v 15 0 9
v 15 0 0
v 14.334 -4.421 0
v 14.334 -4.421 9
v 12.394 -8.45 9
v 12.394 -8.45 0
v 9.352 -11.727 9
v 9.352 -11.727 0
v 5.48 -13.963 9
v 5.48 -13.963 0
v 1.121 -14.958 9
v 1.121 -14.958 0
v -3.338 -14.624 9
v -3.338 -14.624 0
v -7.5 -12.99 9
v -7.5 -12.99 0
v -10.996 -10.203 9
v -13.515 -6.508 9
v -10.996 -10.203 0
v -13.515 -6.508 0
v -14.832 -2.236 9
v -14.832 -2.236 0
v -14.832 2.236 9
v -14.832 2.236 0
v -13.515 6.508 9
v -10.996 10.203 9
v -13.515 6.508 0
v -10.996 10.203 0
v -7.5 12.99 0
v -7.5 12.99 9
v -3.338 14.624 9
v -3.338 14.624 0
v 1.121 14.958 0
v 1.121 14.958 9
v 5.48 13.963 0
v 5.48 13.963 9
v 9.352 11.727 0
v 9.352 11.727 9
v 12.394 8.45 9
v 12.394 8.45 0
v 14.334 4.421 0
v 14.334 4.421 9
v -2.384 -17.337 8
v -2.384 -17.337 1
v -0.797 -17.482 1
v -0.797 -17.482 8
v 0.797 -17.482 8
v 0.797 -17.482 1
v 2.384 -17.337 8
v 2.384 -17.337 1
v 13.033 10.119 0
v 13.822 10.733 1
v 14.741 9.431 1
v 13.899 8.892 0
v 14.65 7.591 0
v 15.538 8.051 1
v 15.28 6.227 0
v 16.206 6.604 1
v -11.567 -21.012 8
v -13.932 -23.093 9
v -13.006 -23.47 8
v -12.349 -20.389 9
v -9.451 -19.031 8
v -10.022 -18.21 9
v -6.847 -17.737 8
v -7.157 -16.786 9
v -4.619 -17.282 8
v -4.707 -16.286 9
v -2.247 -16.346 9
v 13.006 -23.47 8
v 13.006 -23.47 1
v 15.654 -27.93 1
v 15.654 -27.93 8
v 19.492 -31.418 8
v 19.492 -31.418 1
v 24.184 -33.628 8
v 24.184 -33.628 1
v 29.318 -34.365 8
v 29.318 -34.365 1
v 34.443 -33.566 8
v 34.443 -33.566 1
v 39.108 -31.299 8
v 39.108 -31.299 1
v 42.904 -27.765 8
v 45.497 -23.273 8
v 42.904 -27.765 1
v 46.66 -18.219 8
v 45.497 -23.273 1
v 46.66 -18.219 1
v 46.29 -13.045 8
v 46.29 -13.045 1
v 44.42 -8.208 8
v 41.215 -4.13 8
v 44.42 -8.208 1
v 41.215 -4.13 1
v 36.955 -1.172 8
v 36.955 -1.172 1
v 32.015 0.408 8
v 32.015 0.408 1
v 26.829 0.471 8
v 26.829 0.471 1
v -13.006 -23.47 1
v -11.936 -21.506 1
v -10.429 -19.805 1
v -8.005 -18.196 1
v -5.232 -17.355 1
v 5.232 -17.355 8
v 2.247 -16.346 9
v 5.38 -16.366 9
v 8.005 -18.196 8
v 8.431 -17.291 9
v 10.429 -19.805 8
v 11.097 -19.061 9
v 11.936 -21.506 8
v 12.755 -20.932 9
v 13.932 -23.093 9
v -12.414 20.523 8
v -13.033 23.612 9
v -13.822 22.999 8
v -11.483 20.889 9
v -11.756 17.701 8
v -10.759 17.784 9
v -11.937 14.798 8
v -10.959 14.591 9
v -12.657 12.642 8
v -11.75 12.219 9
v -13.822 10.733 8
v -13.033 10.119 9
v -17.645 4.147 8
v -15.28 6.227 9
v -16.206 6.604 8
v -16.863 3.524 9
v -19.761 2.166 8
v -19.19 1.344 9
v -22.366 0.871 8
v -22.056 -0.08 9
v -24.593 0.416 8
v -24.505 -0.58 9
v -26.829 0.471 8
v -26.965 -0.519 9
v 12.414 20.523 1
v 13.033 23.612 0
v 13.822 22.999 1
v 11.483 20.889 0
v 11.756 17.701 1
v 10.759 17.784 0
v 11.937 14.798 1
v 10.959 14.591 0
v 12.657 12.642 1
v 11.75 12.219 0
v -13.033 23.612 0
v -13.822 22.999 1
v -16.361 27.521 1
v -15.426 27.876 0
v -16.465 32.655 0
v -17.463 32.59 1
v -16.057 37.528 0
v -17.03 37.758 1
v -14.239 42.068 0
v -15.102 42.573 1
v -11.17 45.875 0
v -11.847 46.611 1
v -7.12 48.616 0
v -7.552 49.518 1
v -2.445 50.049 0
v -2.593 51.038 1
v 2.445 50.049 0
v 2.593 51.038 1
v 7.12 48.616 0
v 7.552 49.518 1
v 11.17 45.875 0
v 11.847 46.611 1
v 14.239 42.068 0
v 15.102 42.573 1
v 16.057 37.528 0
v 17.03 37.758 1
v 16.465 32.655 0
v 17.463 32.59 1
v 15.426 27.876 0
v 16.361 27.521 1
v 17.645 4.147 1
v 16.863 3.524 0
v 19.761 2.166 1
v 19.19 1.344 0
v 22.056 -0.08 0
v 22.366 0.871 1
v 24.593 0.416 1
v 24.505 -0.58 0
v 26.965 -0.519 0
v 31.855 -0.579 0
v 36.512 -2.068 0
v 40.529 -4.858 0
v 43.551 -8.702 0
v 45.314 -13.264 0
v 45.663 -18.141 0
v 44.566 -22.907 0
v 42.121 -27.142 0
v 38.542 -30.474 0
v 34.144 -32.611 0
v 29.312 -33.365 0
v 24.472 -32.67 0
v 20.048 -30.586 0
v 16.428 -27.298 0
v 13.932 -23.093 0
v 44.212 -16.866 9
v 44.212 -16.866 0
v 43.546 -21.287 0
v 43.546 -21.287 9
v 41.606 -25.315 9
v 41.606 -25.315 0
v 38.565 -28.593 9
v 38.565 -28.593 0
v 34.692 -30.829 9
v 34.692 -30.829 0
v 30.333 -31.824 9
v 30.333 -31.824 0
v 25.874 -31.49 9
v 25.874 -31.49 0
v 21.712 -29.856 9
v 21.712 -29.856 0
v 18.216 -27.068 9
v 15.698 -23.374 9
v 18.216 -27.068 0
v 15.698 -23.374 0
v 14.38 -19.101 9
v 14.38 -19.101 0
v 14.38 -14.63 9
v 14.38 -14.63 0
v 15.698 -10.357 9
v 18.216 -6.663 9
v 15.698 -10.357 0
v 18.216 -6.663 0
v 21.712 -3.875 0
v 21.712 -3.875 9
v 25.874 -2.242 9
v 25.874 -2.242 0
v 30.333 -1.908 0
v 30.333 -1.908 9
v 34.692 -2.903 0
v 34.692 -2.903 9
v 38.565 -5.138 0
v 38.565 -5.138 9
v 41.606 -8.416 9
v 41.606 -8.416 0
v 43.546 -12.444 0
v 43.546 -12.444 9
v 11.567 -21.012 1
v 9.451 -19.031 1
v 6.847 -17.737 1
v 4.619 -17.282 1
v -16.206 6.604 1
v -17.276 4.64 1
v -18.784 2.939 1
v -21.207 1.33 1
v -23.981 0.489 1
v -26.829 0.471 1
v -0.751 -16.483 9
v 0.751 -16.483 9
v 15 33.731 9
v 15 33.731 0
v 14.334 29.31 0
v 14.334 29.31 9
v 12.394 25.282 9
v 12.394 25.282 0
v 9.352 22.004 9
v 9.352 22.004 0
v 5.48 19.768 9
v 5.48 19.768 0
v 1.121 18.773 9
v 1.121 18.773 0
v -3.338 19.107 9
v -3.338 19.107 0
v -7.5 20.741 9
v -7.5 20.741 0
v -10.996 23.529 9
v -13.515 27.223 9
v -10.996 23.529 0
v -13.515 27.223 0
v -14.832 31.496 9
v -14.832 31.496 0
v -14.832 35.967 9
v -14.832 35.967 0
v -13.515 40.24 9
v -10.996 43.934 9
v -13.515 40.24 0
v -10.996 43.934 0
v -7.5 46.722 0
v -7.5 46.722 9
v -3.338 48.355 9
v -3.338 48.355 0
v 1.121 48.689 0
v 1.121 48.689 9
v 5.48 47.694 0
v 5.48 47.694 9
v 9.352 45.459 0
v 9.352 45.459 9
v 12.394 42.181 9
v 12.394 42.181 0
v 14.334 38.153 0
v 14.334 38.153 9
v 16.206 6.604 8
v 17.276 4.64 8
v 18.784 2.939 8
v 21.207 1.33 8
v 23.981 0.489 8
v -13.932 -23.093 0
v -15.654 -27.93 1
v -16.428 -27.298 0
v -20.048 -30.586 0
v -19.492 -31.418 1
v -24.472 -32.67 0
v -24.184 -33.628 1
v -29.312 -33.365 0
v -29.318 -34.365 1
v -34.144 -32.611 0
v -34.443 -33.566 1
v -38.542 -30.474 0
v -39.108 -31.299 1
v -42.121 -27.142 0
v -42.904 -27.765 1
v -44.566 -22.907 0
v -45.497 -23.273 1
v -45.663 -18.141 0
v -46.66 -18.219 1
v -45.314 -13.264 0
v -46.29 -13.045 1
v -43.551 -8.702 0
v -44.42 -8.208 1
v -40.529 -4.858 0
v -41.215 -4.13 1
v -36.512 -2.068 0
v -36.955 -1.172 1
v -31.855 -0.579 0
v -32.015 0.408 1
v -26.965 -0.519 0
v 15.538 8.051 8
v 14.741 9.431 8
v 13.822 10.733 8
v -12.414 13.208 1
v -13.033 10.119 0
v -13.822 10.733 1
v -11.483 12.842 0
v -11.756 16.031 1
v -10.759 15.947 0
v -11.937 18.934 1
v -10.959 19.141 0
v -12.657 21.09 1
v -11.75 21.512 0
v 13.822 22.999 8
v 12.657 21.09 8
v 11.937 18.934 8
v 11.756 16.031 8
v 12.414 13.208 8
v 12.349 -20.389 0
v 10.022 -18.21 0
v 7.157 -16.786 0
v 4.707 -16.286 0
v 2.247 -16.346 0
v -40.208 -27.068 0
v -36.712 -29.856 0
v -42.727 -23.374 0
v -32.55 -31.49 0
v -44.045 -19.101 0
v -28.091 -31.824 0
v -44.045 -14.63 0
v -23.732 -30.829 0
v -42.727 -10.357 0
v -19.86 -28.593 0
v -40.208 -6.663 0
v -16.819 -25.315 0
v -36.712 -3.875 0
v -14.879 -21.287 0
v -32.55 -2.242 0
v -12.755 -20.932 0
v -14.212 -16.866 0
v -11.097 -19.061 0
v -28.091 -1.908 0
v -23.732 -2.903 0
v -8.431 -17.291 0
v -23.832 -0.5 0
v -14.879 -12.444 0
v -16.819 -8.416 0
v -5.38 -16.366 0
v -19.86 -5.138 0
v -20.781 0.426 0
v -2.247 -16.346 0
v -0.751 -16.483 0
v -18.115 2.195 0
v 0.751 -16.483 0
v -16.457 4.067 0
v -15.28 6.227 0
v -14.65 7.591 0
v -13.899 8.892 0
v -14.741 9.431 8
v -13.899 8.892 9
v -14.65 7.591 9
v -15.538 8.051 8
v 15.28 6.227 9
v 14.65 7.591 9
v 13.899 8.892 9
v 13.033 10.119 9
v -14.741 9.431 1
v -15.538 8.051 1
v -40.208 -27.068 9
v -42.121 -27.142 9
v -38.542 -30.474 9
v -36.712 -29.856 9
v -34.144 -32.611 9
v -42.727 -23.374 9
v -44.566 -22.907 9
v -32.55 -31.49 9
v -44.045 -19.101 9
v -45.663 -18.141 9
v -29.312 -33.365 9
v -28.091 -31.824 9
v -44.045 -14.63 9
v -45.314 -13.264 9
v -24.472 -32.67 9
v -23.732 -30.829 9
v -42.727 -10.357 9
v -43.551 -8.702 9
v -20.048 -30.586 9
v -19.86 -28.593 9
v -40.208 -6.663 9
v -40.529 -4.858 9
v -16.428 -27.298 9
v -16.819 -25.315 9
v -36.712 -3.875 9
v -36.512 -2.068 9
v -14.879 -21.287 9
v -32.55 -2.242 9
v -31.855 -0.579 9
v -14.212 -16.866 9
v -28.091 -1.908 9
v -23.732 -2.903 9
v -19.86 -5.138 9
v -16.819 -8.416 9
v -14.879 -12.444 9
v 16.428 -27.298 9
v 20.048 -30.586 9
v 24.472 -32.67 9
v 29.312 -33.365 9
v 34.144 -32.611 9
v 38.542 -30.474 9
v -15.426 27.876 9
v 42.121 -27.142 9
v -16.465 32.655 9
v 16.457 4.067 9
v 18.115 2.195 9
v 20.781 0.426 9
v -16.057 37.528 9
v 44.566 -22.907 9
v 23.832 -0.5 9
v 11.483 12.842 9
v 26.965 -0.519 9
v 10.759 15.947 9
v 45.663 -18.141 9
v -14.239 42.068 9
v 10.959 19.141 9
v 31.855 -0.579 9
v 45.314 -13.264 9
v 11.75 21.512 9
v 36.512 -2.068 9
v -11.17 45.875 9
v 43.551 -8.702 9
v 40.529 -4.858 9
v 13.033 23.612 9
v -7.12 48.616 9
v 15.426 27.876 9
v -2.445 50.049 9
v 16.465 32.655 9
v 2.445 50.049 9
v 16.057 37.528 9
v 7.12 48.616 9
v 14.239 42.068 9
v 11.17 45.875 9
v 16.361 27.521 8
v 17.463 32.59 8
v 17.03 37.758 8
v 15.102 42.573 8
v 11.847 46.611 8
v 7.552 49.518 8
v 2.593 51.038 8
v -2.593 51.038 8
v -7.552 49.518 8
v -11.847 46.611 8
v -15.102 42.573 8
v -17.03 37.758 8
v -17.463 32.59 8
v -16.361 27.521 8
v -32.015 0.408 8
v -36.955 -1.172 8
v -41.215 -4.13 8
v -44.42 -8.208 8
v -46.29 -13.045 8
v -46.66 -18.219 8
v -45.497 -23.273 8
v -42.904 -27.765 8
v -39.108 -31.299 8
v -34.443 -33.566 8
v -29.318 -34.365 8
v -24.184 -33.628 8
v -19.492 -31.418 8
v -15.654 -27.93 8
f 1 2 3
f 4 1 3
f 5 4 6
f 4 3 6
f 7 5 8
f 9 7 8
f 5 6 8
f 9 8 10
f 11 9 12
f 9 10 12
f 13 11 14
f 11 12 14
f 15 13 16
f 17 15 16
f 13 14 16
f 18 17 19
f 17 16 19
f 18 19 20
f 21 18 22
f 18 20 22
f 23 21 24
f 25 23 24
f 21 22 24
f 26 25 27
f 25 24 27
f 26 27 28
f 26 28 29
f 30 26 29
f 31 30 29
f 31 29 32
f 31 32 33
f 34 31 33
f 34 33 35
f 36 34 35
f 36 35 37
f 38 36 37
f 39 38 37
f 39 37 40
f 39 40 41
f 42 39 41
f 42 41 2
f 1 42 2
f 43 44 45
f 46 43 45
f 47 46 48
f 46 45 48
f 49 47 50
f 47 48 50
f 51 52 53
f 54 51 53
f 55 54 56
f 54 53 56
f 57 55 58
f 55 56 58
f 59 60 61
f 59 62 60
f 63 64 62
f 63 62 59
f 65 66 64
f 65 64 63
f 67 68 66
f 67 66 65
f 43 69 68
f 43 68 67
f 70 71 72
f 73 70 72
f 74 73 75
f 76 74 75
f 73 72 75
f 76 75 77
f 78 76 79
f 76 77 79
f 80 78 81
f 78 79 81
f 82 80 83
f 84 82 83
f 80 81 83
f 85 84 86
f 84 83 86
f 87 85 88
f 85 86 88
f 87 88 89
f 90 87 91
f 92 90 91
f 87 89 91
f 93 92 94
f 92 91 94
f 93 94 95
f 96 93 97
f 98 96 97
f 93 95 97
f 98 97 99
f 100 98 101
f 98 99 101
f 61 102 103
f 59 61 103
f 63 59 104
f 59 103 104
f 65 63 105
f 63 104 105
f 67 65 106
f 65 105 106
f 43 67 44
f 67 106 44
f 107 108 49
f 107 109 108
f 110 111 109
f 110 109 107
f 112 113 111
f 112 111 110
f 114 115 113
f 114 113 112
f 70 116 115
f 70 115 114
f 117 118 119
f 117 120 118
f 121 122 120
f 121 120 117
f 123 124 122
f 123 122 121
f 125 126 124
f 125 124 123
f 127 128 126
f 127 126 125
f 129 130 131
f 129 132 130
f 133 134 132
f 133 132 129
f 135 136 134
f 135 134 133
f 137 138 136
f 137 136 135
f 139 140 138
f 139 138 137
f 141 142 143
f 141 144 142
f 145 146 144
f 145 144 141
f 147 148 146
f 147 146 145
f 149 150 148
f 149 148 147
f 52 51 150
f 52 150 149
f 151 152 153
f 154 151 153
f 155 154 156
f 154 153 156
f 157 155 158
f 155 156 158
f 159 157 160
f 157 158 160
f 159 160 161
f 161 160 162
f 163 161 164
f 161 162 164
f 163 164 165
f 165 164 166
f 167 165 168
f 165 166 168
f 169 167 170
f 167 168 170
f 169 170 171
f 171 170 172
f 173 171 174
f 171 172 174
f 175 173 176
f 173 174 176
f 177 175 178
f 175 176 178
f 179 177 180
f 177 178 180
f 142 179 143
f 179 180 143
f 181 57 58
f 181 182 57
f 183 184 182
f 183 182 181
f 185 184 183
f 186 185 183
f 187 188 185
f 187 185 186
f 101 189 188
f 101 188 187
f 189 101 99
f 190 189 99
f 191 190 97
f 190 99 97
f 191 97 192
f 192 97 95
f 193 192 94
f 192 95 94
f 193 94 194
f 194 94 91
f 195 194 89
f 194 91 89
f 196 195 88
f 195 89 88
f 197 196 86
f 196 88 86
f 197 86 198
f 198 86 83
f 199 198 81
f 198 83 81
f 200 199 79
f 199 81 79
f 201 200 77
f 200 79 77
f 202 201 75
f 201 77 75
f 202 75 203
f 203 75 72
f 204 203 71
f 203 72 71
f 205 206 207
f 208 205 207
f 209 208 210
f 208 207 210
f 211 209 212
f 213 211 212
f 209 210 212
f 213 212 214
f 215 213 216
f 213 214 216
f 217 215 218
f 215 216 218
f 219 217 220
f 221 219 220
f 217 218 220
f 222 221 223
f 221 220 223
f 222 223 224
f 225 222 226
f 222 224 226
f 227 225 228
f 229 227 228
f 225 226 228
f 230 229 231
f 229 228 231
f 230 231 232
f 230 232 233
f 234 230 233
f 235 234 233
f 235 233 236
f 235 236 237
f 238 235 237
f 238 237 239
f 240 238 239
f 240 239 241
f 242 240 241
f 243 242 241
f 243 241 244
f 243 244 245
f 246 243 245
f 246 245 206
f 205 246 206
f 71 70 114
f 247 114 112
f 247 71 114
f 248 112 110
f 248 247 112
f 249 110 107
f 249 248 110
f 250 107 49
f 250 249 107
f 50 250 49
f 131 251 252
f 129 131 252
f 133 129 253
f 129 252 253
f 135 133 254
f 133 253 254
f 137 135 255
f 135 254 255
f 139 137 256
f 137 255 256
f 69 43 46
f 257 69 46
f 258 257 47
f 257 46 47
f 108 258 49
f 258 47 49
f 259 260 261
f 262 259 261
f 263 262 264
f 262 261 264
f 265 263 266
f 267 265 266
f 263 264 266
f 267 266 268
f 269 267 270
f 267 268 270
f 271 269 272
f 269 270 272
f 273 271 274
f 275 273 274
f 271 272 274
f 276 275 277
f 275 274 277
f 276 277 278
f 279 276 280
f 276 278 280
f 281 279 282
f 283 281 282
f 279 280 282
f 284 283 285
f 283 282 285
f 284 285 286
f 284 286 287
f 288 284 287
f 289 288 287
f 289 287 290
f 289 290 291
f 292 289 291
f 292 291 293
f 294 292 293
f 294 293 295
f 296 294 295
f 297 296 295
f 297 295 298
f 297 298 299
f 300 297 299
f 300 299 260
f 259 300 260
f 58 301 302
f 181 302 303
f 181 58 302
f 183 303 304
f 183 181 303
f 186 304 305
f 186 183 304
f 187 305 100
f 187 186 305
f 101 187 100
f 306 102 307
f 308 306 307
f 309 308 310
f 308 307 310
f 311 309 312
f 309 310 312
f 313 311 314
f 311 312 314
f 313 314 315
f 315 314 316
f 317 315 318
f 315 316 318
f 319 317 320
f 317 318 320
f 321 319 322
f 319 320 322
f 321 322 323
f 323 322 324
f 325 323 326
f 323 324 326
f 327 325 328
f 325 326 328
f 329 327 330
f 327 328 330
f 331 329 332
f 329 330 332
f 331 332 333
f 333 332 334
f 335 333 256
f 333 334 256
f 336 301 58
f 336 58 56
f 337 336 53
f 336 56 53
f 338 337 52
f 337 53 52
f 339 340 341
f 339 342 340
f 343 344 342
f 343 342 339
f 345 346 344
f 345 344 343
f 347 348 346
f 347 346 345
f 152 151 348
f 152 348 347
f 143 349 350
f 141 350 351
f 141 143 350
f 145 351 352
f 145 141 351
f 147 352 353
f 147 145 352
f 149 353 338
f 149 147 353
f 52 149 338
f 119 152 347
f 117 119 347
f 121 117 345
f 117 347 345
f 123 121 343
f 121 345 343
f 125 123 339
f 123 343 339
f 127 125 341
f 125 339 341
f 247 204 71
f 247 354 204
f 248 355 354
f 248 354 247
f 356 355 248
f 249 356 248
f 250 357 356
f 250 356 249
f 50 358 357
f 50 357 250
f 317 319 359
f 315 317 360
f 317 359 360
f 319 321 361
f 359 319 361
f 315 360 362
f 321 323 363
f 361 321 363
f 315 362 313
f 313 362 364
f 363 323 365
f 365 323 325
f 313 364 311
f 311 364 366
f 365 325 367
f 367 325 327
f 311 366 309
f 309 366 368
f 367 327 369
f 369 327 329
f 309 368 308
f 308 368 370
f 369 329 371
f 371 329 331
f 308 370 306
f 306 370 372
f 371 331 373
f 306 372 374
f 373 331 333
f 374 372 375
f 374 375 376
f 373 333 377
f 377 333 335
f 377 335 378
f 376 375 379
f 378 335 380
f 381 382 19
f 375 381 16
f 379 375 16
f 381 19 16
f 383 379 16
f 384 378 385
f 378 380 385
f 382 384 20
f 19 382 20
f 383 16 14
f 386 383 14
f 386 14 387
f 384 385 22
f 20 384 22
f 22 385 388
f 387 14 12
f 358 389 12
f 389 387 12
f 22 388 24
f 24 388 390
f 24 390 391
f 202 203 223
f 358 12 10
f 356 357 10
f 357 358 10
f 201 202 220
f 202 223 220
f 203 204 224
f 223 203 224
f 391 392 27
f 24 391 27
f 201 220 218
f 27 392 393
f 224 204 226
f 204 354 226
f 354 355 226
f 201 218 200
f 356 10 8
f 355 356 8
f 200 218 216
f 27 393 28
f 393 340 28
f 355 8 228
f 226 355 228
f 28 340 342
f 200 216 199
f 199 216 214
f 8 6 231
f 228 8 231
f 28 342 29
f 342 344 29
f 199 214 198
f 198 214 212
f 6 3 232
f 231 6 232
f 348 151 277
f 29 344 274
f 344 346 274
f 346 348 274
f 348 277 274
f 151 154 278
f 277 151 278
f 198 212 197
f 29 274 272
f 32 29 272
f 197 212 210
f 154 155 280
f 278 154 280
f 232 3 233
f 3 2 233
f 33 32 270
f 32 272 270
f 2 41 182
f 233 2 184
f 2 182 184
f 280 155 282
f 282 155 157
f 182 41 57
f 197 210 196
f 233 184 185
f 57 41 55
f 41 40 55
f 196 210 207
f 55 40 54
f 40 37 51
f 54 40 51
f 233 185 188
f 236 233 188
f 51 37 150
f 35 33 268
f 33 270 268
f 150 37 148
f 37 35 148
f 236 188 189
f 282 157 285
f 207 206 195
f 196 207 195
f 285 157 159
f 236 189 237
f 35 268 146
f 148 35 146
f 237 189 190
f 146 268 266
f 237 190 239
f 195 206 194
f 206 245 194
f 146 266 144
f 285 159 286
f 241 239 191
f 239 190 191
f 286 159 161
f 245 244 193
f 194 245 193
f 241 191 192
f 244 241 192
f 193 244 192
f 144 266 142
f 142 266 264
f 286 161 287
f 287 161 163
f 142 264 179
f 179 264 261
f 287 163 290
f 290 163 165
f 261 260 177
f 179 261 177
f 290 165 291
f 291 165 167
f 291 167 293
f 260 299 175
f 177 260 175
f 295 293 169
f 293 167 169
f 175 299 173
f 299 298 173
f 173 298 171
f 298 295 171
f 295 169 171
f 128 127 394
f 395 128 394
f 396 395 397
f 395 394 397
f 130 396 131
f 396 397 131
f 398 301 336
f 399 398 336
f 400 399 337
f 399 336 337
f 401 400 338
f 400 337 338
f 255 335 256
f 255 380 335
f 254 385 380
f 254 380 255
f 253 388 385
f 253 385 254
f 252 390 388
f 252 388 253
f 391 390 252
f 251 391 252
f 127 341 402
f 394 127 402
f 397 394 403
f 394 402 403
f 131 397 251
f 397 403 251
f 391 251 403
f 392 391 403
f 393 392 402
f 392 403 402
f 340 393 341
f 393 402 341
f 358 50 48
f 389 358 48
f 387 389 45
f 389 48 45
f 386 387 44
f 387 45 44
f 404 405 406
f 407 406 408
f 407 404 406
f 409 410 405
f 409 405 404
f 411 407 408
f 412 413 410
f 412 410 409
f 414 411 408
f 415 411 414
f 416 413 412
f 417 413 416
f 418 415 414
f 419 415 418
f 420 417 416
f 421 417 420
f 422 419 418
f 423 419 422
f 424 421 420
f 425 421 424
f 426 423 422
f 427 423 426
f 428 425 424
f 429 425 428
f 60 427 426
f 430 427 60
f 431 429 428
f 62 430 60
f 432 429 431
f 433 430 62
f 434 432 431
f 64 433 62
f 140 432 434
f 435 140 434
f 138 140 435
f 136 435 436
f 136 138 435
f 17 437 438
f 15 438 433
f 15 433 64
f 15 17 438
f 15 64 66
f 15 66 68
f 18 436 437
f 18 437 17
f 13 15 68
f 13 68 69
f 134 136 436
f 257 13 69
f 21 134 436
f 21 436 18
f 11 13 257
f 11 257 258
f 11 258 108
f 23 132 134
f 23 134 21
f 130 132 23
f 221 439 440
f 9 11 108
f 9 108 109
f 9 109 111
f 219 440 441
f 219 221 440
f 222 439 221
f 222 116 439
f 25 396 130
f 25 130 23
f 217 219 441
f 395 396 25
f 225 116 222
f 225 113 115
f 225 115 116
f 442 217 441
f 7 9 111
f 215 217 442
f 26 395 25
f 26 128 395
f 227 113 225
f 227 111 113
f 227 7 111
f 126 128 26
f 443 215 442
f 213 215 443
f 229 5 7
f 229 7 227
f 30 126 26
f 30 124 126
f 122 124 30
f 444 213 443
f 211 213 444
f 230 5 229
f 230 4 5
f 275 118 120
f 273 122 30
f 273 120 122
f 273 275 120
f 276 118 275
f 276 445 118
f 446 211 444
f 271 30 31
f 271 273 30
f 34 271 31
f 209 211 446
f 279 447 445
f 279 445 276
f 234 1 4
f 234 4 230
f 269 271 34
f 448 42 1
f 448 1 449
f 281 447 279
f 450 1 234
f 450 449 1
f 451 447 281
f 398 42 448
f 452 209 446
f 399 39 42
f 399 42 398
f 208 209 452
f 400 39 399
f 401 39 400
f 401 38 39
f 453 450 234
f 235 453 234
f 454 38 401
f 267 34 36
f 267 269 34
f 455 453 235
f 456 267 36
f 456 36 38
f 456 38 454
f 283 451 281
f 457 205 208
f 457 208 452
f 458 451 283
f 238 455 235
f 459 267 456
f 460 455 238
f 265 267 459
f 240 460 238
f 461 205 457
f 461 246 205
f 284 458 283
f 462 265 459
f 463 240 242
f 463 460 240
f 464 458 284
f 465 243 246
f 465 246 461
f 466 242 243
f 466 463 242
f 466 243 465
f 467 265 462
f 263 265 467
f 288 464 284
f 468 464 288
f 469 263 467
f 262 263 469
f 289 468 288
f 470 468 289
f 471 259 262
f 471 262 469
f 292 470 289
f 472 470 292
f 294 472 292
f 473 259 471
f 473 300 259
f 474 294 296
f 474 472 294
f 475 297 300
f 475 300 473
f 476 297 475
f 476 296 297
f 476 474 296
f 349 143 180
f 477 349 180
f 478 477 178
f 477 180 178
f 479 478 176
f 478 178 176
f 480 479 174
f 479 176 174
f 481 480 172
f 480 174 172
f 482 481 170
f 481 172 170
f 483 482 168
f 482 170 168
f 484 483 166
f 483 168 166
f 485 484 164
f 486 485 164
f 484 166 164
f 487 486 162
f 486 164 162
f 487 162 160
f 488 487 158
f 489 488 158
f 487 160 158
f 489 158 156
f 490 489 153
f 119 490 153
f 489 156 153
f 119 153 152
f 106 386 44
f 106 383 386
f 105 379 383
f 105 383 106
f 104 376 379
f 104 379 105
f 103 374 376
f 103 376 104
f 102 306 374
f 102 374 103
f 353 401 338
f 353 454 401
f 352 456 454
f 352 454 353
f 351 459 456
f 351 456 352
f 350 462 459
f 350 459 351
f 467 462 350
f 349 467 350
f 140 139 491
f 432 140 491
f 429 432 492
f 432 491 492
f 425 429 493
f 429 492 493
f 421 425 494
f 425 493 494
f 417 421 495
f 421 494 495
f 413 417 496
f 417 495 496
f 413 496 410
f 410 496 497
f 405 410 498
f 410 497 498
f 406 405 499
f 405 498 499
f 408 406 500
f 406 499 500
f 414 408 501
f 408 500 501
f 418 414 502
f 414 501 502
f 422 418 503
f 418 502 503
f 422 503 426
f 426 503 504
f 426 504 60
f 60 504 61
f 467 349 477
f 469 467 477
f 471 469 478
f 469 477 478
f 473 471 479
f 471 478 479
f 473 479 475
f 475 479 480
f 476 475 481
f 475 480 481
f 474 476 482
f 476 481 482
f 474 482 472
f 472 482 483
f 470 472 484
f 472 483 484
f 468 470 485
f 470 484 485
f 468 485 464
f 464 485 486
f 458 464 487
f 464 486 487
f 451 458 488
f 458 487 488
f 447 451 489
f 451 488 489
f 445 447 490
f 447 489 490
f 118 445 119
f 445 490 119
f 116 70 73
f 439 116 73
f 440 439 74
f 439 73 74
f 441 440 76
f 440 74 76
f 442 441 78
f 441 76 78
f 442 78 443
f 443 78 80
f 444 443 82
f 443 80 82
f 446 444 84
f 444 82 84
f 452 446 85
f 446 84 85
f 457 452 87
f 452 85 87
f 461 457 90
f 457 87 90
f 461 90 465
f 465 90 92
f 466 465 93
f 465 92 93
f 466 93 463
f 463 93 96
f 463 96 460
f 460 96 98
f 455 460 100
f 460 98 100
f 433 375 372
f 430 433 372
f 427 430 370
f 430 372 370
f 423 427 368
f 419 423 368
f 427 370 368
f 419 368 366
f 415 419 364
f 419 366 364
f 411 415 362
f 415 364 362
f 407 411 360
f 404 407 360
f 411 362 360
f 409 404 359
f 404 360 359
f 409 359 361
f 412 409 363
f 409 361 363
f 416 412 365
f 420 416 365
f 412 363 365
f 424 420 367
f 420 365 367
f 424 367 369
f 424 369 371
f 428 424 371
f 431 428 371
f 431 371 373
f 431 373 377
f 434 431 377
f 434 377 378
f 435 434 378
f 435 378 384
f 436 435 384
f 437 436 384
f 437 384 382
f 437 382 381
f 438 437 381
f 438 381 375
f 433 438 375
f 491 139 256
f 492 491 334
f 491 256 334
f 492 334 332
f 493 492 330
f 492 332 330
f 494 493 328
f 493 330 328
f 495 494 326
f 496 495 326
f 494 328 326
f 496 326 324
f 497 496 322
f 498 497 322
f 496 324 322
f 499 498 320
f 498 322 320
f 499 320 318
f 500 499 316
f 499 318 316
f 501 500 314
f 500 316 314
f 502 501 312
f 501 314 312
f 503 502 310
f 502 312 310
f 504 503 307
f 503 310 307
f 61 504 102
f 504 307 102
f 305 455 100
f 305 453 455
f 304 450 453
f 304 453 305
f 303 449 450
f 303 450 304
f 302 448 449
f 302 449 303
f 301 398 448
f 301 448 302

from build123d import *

# Parameters (mm, degrees)
F0_R      = 17.5
F1_DEPTH  = 9
F2_R      = 17.5
F3_DEPTH  = 9
F4_R      = 15
F6_DEPTH  = 25
F5_R      = 15
F7_DEPTH  = 25
F8_R      = 15
F9_DEPTH  = 25
F10_R     = 15
F11_DEPTH = 25
F12_R     = 10
F13_SIZE  = 1
F14_SIZE  = 1


with BuildPart() as f1:
    # F0 (on Top) → F1 (new body)
    with BuildSketch(Plane.XY):
        Circle(F0_R)
    extrude(amount=F1_DEPTH)

    # F2 (on Top) → F3 (join)
    with BuildSketch(Plane.XY):
        with Locations((0, 33.7313876416)):
            Circle(F2_R)
        with Locations((29.2122386025, -16.8656938208)):
            Circle(F2_R)
        with Locations((-29.2122386025, -16.8656938208)):
            Circle(F2_R)
    extrude(amount=F3_DEPTH)

    # F4 (on face) → F6 (cut)
    with BuildSketch(Plane(origin=(0, 0, 0), x_dir=(1, 0, 0), z_dir=(0, 0, -1))):
        with Locations((0, -33.7313876416)):
            Circle(F4_R)
    extrude(amount=-F6_DEPTH, mode=Mode.SUBTRACT)

    # F5 (on face) → F7 (cut)
    with BuildSketch(Plane(origin=(0, 0, 0), x_dir=(1, 0, 0), z_dir=(0, 0, -1))):
        Circle(F5_R)
    extrude(amount=-F7_DEPTH, mode=Mode.SUBTRACT)

    # F8 (on face) → F9 (cut)
    with BuildSketch(Plane(origin=(0, 0, 0), x_dir=(1, 0, 0), z_dir=(0, 0, -1))):
        with Locations((-29.2122386025, 16.8656938208)):
            Circle(F8_R)
    extrude(amount=-F9_DEPTH, mode=Mode.SUBTRACT)

    # F10 (on face) → F11 (cut)
    with BuildSketch(Plane(origin=(0, 0, 0), x_dir=(1, 0, 0), z_dir=(0, 0, -1))):
        with Locations((29.2122386025, 16.8656938208)):
            Circle(F10_R)
    extrude(amount=-F11_DEPTH, mode=Mode.SUBTRACT)

    # F12
    f12_edges = [f1.edges().sort_by_distance(p)[0] for p in [
        (16.940556, -4.389485, 4.5),
        (12.271683, -12.476209, 4.5),
        (-16.940556, -4.389485, 4.5),
        (-12.271683, -12.476209, 4.5),
        (4.668873, 16.865694, 4.5),
        (-4.668873, 16.865694, 4.5),
    ]]
    fillet(f12_edges, radius=F12_R)

    # F13
    f13_edges = [f1.edges().sort_by_distance(p)[0] for p in [
        (44.367683, -25.615694, 0),
    ]]
    chamfer(f13_edges, length=F13_SIZE)

    # F14
    f14_edges = [f1.edges().sort_by_distance(p)[0] for p in [
        (44.367683, -25.615694, 9),
    ]]
    chamfer(f14_edges, length=F14_SIZE)


solid = f1.part
